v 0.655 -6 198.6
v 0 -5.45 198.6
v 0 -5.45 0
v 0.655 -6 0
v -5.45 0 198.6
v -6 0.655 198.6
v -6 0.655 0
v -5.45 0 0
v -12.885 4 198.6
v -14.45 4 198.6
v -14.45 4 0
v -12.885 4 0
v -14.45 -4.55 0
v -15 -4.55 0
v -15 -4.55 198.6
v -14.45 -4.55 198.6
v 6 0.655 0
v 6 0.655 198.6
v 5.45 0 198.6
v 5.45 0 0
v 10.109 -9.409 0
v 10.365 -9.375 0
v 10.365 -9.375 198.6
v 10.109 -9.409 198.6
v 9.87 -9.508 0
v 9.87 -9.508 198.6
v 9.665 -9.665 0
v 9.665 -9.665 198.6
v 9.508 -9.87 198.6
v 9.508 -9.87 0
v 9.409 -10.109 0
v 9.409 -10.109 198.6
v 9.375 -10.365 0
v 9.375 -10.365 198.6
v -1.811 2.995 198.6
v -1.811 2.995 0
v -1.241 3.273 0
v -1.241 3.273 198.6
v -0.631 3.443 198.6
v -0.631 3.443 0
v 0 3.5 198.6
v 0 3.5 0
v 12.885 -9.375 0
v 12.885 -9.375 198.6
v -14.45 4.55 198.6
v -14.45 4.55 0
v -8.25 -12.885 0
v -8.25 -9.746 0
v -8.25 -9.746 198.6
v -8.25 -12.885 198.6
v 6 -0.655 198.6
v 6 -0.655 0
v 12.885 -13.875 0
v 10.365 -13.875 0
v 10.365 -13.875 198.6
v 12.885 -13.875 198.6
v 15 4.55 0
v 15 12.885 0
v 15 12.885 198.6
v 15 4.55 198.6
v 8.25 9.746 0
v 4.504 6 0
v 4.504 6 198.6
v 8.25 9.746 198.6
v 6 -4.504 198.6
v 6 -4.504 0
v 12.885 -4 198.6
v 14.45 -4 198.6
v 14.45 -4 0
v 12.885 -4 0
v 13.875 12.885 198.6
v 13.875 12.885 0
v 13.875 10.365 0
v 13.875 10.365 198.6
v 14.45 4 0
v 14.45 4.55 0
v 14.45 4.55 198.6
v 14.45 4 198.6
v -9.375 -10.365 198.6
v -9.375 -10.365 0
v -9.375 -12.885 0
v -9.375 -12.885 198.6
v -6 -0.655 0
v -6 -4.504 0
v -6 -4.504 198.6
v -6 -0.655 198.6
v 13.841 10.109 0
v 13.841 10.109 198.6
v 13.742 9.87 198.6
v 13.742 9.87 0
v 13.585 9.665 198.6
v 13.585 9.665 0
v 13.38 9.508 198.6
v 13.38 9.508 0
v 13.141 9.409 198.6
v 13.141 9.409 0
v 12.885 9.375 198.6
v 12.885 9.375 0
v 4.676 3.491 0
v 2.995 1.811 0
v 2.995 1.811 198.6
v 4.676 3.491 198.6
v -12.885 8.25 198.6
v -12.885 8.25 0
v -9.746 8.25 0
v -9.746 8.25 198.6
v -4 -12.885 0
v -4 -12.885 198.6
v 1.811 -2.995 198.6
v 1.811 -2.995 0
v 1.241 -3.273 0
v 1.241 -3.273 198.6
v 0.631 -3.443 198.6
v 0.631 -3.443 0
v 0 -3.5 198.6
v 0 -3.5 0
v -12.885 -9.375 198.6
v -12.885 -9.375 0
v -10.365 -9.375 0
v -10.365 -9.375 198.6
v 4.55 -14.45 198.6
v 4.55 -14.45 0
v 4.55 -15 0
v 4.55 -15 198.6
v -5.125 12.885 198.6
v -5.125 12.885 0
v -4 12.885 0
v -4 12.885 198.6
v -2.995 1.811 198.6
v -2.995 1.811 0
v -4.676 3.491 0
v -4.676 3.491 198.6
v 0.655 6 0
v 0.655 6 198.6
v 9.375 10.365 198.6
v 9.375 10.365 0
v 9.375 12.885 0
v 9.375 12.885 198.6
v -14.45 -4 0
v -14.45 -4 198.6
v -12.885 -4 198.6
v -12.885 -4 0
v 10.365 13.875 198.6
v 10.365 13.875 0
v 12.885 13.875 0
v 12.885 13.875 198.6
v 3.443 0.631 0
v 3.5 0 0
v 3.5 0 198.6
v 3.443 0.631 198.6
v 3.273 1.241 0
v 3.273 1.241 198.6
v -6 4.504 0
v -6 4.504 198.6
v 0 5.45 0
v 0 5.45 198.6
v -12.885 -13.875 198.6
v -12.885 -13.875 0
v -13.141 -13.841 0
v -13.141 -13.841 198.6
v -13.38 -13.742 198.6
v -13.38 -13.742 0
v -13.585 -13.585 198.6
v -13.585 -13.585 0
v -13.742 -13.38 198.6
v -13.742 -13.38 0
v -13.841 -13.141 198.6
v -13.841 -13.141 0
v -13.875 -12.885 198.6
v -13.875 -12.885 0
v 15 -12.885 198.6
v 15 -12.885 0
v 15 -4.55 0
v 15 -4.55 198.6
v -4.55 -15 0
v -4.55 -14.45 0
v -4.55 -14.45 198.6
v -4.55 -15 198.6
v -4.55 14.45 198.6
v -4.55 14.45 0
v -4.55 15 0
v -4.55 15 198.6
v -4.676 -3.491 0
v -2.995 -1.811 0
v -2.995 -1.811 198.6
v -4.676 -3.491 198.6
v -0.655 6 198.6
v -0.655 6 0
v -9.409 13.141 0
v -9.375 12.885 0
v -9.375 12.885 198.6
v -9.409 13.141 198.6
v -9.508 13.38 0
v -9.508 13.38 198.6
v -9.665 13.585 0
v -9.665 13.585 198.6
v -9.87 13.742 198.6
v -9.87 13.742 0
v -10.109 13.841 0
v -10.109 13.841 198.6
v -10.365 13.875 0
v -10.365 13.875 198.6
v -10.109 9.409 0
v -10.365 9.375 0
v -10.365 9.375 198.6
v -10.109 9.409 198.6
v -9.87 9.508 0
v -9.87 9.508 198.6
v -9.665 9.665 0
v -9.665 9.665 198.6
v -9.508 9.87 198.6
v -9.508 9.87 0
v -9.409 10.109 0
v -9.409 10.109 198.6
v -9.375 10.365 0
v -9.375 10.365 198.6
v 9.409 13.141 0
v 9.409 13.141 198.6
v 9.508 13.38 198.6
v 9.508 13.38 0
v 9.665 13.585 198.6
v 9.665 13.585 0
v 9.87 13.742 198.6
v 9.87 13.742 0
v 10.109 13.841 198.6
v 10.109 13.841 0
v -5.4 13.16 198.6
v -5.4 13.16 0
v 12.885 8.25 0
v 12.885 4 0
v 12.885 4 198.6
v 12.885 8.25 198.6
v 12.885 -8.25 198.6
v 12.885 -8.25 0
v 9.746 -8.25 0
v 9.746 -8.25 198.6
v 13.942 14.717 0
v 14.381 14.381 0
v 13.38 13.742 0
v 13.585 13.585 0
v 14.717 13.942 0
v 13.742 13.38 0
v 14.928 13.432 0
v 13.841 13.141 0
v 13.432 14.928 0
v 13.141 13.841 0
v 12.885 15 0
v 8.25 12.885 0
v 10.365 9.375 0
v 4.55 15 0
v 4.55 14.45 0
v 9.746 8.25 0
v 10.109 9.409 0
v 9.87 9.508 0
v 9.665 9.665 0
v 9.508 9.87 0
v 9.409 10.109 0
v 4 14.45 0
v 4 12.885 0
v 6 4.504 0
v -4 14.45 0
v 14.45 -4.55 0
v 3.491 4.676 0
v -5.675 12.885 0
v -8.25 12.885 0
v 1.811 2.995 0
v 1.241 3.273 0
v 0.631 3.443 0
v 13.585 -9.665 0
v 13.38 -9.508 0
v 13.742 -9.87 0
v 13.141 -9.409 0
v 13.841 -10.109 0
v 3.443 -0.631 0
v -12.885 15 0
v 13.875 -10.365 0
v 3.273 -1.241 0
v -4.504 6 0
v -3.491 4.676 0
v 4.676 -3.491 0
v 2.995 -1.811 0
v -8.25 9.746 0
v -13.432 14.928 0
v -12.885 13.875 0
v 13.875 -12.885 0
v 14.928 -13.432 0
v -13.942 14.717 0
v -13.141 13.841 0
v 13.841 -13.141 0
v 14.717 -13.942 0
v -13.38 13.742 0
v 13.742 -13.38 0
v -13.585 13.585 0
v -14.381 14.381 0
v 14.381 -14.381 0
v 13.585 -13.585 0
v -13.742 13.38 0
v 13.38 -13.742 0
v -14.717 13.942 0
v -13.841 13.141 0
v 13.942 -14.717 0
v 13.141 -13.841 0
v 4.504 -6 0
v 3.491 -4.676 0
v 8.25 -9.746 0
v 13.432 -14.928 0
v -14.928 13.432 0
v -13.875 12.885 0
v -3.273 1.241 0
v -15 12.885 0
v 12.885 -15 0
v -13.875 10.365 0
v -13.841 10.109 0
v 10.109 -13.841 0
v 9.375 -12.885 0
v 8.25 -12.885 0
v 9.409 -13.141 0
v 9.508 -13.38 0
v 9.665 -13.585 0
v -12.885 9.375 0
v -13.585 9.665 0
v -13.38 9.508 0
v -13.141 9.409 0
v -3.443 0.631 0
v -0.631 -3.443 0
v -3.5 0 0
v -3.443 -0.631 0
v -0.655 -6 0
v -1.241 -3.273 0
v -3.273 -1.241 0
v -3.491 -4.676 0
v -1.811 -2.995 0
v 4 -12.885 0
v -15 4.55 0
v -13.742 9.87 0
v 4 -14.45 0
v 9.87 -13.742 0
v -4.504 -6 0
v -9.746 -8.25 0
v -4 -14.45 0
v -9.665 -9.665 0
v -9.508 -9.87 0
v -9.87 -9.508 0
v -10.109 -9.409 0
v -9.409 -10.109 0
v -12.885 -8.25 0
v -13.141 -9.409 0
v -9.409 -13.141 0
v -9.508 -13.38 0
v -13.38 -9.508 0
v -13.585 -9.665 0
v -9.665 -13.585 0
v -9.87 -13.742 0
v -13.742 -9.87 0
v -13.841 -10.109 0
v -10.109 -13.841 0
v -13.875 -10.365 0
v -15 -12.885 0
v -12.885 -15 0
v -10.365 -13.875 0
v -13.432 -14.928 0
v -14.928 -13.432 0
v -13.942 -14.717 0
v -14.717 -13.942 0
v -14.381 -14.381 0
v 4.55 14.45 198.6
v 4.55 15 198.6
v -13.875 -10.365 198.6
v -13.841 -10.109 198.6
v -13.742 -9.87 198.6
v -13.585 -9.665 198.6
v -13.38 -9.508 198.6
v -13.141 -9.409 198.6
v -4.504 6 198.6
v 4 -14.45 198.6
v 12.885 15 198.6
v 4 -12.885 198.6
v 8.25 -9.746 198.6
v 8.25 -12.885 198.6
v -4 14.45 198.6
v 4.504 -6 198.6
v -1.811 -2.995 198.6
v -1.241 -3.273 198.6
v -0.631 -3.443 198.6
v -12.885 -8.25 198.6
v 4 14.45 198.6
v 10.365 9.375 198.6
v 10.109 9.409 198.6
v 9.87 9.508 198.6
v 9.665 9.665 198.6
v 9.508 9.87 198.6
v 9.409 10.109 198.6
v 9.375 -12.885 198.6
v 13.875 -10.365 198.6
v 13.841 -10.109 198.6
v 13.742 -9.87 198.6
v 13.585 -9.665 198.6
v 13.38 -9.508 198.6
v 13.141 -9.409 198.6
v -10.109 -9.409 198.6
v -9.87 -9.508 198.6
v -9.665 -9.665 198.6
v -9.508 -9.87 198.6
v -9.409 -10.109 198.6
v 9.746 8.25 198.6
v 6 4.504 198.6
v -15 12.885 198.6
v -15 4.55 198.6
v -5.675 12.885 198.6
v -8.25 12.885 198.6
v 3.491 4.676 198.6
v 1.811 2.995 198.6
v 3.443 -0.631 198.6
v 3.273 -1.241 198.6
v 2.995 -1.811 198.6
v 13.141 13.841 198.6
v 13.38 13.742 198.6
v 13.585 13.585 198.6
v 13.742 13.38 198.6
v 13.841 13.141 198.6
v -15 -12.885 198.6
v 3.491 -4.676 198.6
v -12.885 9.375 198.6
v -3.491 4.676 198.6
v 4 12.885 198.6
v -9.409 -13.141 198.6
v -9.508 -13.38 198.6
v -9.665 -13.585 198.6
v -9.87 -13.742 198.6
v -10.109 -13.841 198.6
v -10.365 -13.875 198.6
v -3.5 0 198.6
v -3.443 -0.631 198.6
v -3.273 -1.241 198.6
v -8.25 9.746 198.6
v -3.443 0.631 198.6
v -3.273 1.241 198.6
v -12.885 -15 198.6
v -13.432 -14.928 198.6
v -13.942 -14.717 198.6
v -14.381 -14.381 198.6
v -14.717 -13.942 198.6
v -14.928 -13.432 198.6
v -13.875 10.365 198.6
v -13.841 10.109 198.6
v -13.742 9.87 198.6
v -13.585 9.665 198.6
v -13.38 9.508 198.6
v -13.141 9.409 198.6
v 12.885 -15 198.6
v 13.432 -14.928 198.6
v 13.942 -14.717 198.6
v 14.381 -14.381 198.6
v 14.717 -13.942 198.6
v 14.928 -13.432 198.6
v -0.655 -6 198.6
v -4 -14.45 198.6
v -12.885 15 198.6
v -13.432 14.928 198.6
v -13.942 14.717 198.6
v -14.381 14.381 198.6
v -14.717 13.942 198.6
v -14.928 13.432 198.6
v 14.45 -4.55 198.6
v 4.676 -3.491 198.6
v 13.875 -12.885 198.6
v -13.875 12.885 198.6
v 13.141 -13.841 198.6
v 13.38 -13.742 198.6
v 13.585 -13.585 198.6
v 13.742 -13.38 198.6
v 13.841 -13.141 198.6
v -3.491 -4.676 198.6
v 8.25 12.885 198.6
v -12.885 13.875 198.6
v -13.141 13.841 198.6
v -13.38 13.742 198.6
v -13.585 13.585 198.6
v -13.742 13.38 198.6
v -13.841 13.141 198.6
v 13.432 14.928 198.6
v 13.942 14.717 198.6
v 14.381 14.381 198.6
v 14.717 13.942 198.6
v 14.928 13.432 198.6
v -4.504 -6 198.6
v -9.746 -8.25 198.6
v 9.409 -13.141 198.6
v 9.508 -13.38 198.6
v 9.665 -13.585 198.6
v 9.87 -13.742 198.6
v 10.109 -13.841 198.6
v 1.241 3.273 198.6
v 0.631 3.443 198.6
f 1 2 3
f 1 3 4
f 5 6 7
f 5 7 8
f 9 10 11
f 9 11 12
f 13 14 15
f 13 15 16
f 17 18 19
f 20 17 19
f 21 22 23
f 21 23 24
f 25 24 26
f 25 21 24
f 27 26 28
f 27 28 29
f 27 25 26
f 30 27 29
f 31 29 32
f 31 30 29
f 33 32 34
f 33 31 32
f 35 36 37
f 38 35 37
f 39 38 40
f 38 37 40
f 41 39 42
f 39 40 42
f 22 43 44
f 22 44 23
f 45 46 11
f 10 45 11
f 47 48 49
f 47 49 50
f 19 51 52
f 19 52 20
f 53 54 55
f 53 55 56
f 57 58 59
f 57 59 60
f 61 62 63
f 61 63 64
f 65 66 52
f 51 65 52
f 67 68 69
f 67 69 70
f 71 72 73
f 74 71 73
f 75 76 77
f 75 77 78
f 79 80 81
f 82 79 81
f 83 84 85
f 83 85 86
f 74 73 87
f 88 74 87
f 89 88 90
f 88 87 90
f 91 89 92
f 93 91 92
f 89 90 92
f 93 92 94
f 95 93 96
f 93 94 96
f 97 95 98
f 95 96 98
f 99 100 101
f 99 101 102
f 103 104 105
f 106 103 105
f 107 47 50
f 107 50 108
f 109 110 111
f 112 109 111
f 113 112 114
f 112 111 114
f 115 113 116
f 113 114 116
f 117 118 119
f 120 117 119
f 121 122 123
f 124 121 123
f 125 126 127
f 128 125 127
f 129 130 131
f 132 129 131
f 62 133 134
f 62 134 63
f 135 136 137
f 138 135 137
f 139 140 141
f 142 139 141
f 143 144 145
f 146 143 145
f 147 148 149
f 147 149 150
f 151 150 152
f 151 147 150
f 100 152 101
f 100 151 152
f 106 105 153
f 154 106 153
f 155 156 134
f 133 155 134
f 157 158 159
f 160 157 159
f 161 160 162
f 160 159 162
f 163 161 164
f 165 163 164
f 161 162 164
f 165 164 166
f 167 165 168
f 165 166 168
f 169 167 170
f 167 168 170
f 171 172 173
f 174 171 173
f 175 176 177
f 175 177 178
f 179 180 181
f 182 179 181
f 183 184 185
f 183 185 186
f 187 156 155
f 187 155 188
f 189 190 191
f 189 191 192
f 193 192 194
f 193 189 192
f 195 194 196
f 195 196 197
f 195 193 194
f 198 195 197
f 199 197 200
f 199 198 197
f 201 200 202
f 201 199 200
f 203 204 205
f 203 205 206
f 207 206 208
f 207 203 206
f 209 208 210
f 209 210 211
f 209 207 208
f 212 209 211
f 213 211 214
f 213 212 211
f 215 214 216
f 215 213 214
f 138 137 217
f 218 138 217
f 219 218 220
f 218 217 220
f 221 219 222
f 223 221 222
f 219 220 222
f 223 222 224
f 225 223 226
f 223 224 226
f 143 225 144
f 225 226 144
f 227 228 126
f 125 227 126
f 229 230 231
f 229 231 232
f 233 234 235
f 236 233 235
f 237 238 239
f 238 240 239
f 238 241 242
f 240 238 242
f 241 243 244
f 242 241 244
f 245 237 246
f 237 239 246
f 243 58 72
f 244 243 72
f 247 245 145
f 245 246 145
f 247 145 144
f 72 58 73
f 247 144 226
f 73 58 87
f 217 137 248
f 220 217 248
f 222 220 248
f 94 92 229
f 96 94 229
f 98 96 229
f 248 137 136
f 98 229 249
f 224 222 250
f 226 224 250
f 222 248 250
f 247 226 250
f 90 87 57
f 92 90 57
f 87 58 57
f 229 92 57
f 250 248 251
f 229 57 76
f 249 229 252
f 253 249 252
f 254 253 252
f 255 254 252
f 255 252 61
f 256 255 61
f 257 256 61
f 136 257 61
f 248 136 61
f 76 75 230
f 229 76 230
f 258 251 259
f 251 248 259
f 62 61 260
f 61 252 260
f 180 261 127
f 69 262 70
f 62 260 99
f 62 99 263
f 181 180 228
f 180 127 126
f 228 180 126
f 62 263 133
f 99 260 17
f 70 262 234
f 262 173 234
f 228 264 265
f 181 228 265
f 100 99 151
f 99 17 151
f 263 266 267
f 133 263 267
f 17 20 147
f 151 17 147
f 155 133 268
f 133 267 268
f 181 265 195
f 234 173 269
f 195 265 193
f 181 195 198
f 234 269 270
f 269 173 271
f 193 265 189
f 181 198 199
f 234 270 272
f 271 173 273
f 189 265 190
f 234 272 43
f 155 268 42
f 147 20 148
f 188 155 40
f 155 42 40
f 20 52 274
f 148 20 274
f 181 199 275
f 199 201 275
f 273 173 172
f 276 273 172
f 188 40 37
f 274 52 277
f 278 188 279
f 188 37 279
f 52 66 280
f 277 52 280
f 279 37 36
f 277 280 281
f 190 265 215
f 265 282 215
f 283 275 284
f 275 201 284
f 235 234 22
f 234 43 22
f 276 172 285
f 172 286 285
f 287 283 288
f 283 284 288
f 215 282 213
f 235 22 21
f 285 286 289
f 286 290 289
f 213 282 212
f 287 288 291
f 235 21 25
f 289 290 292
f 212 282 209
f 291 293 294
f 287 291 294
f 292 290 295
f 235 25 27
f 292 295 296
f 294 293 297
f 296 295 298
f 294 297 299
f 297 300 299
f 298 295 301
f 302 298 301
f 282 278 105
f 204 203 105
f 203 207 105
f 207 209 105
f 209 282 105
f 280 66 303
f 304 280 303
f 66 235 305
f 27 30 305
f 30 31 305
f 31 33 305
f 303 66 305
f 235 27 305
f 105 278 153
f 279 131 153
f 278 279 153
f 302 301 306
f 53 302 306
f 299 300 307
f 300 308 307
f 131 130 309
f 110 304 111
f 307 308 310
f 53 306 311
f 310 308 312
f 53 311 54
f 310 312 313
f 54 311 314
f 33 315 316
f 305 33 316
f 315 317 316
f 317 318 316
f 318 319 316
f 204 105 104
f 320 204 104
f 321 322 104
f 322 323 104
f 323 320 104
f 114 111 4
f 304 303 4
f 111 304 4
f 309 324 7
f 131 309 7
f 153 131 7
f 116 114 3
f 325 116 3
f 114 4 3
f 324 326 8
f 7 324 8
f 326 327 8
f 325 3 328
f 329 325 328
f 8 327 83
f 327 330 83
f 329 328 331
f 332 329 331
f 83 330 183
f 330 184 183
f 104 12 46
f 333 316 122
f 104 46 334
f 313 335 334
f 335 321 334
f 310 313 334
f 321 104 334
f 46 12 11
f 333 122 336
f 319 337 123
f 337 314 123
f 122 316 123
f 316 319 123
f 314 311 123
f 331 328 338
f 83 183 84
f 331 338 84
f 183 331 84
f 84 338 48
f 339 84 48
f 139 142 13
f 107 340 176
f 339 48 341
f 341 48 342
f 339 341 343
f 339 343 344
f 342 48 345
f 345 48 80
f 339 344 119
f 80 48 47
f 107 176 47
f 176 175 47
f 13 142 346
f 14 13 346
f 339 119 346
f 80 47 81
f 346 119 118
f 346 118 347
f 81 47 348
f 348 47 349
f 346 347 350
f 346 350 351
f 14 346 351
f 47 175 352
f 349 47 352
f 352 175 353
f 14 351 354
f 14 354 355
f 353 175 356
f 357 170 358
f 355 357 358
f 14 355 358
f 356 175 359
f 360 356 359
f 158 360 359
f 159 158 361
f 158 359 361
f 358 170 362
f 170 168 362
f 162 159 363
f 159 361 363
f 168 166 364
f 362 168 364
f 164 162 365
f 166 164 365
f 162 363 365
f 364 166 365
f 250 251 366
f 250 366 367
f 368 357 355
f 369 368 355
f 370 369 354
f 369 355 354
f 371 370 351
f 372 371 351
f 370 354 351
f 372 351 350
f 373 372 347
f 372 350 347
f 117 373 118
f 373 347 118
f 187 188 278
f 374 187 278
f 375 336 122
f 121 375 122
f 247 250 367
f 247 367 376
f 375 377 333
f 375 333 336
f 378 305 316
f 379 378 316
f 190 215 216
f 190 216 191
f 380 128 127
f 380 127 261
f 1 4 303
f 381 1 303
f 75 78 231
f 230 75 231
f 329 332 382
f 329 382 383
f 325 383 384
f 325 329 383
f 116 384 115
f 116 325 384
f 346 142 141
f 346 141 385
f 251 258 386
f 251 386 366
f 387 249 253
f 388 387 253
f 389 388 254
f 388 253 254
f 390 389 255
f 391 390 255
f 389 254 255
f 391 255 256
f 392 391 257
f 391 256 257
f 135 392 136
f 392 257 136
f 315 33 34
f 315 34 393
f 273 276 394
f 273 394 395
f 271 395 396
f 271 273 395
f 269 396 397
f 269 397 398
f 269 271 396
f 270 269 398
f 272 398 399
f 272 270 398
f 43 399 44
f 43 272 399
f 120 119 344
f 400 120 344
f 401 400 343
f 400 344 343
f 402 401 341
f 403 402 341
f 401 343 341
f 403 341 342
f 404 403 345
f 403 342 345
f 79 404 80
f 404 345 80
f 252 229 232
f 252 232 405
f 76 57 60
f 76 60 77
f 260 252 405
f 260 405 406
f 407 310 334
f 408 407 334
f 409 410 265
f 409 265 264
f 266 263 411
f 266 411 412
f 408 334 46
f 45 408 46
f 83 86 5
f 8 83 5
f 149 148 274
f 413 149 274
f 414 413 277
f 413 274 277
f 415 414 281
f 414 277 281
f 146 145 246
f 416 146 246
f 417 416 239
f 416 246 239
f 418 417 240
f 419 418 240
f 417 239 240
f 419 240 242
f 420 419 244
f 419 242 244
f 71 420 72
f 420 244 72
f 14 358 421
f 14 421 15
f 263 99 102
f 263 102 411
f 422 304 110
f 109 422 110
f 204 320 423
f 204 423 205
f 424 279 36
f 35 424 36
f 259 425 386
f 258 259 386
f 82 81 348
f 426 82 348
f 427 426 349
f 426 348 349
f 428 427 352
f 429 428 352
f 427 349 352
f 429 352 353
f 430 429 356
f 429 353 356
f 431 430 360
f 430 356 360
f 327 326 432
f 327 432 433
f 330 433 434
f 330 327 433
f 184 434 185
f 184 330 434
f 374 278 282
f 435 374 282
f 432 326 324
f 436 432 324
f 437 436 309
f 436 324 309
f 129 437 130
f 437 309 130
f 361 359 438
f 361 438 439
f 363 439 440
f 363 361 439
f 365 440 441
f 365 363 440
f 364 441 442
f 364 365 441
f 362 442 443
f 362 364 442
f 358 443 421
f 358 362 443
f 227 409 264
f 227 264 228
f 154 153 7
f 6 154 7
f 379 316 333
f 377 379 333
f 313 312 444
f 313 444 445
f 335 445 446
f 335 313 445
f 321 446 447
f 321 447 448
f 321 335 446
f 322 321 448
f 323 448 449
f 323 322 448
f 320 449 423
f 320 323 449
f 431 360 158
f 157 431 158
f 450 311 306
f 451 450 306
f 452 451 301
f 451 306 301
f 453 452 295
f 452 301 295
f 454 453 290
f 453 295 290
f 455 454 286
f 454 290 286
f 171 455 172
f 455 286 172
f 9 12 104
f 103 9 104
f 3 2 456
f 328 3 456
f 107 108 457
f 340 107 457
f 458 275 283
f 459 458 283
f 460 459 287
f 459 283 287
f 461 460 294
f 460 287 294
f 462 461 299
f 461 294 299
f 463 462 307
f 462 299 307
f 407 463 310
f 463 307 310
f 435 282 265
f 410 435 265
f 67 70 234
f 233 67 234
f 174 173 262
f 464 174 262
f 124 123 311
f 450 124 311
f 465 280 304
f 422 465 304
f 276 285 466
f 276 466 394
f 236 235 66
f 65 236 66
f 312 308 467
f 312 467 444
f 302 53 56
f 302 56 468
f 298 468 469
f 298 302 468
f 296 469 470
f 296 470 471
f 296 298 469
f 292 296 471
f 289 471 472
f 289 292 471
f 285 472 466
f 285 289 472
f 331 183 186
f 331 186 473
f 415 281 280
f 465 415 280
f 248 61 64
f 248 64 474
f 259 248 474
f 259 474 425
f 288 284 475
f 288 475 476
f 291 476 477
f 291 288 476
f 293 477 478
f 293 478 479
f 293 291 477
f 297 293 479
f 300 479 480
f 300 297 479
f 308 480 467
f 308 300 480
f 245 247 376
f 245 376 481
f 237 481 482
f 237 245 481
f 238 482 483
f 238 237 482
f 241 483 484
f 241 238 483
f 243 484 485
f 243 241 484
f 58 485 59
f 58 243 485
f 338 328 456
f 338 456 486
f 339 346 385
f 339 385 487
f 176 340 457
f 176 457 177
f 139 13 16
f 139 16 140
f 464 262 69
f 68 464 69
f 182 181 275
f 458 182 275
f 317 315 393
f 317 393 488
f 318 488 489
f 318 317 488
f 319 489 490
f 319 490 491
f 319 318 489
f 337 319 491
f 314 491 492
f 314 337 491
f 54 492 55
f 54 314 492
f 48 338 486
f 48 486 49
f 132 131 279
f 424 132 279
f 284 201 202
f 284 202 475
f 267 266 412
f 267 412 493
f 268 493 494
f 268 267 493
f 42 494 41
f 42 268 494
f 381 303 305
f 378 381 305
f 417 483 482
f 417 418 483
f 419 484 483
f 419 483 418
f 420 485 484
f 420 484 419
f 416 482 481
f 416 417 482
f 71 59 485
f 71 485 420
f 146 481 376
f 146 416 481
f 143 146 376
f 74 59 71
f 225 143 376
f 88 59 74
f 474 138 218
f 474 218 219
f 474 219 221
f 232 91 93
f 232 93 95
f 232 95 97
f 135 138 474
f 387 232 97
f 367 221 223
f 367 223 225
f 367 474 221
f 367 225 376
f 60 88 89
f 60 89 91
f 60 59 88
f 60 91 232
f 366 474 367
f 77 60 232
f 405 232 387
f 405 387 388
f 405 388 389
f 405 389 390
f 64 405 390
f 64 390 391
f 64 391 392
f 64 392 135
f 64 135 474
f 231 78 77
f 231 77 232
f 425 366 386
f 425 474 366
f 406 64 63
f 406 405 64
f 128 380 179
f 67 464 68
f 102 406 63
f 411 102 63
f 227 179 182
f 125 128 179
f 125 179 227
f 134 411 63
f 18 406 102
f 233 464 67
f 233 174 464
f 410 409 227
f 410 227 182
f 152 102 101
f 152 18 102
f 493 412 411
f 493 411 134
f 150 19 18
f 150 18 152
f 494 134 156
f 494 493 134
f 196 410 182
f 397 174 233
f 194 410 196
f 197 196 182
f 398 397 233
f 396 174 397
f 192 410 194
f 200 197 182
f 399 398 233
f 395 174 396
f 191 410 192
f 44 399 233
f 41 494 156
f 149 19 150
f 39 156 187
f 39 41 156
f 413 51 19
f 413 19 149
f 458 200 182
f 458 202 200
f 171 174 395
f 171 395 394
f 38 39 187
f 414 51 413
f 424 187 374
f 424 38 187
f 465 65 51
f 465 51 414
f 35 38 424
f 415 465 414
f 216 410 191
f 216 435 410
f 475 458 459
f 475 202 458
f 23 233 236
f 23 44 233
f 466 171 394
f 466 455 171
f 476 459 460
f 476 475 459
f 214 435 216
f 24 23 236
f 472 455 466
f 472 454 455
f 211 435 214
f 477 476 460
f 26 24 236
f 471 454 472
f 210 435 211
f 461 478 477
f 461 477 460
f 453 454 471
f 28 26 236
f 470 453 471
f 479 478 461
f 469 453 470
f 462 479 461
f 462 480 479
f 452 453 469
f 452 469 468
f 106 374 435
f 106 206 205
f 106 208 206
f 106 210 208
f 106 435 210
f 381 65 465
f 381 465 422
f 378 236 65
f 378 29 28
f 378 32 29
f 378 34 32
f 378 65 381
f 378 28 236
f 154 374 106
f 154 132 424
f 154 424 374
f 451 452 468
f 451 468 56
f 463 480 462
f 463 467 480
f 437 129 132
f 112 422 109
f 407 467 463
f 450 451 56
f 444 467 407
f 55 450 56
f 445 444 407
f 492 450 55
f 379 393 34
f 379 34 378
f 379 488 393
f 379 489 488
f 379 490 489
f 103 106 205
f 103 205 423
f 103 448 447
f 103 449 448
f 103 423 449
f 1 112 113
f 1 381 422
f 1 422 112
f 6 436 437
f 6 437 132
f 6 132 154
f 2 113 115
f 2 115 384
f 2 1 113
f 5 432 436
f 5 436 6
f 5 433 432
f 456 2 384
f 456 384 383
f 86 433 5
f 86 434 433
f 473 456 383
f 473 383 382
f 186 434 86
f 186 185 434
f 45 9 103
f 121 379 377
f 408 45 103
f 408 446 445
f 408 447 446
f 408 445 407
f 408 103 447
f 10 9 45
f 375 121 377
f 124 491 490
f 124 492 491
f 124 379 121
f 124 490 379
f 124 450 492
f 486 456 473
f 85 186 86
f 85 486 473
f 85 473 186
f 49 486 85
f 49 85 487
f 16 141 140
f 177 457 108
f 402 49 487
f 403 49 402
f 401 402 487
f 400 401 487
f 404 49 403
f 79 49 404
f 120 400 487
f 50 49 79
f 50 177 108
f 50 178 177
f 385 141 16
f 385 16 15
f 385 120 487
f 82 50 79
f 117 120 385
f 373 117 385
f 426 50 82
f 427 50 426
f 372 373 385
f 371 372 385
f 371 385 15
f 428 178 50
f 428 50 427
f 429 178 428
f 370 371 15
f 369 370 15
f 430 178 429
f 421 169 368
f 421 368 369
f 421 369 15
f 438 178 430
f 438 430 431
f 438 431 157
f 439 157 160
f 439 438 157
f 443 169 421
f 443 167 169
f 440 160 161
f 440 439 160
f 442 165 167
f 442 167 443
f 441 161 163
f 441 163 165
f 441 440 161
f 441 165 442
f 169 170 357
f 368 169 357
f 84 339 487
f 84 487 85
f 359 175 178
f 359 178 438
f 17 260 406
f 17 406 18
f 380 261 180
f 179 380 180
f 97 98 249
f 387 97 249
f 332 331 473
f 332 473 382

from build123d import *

# Parameters (mm, degrees)
BOSS_EXTRUDE1_DEPTH     = 198.6
CUT_EXTRUDE1_DEPTH      = 1
CUT_EXTRUDE1_DEPTH_BACK = 199.6


with BuildPart() as part:
    # Sketch4 → Boss-Extrude1 (new body)
    with BuildSketch(Plane.XY):
        with BuildLine():
            Line((0, -5.45), (0.655464476, -6))
            Line((0.655464476, -6), (4.504469158, -6))
            Line((4.504469158, -6), (8.25, -9.745530842))
            Line((8.25, -9.745530842), (8.25, -12.885))
            Line((8.25, -12.885), (4, -12.885))
            Line((4, -12.885), (4, -14.45))
            Line((4, -14.45), (4.55, -14.45))
            Line((4.55, -14.45), (4.55, -15))
            Line((4.55, -15), (12.885, -15))
            ThreePointArc((12.885, -15), (14.380530842, -14.380530842), (15, -12.885))
            Line((15, -12.885), (15, -4.55))
            Line((15, -4.55), (14.45, -4.55))
            Line((14.45, -4.55), (14.45, -4))
            Line((14.45, -4), (12.885, -4))
            Line((12.885, -4), (12.885, -8.25))
            Line((12.885, -8.25), (9.745530842, -8.25))
            Line((9.745530842, -8.25), (6, -4.504469158))
            Line((6, -4.504469158), (6, -0.655464476))
            Line((6, -0.655464476), (5.45, 0))
            Line((5.45, 0), (3.5, 0))
            ThreePointArc((3.5, 0), (3.371433308, -0.939913534), (2.995178599, -1.81077474))
            Line((2.995178599, -1.81077474), (4.675743591, -3.491339732))
            Line((4.675743591, -3.491339732), (3.491339732, -4.675743591))
            Line((3.491339732, -4.675743591), (1.81077474, -2.995178599))
            ThreePointArc((1.81077474, -2.995178599), (0.939913534, -3.371433308), (0, -3.5))
            Line((0, -3.5), (0, -5.45))
        make_face()
        with BuildLine():
            Line((9.375, -10.365), (9.375, -12.885))
            ThreePointArc((9.375, -12.885), (9.664964287, -13.585035713), (10.365, -13.875))
            Line((10.365, -13.875), (12.885, -13.875))
            ThreePointArc((12.885, -13.875), (13.585035713, -13.585035713), (13.875, -12.885))
            Line((13.875, -12.885), (13.875, -10.365))
            ThreePointArc((13.875, -10.365), (13.585035713, -9.664964287), (12.885, -9.375))
            Line((12.885, -9.375), (10.365, -9.375))
            ThreePointArc((10.365, -9.375), (9.664964287, -9.664964287), (9.375, -10.365))
        make_face(mode=Mode.SUBTRACT)
    extrude(amount=BOSS_EXTRUDE1_DEPTH)

    # Mirror1: part across plane


with BuildPart() as part_1:
    add(part.part)
    add(part.part.mirror(Plane(origin=(0, 0, 0), x_dir=(0, 0, 1), z_dir=(1, 0, 0))))

    # Mirror2: part across plane


with BuildPart() as part_2:
    add(part_1.part)
    add(part_1.part.mirror(Plane.ZX))

    # Sketch5 → Cut-Extrude1 (cut, two sides)
    with BuildSketch(Plane.XY.offset(198.6)) as cut_extrude1_sk:
        Polygon((-5.675, 12.885), (-5.4, 13.16), (-5.125, 12.885), align=None)
    extrude(amount=CUT_EXTRUDE1_DEPTH, mode=Mode.SUBTRACT)
    extrude(cut_extrude1_sk.sketch, amount=-CUT_EXTRUDE1_DEPTH_BACK, mode=Mode.SUBTRACT)


solid = part_2.part
